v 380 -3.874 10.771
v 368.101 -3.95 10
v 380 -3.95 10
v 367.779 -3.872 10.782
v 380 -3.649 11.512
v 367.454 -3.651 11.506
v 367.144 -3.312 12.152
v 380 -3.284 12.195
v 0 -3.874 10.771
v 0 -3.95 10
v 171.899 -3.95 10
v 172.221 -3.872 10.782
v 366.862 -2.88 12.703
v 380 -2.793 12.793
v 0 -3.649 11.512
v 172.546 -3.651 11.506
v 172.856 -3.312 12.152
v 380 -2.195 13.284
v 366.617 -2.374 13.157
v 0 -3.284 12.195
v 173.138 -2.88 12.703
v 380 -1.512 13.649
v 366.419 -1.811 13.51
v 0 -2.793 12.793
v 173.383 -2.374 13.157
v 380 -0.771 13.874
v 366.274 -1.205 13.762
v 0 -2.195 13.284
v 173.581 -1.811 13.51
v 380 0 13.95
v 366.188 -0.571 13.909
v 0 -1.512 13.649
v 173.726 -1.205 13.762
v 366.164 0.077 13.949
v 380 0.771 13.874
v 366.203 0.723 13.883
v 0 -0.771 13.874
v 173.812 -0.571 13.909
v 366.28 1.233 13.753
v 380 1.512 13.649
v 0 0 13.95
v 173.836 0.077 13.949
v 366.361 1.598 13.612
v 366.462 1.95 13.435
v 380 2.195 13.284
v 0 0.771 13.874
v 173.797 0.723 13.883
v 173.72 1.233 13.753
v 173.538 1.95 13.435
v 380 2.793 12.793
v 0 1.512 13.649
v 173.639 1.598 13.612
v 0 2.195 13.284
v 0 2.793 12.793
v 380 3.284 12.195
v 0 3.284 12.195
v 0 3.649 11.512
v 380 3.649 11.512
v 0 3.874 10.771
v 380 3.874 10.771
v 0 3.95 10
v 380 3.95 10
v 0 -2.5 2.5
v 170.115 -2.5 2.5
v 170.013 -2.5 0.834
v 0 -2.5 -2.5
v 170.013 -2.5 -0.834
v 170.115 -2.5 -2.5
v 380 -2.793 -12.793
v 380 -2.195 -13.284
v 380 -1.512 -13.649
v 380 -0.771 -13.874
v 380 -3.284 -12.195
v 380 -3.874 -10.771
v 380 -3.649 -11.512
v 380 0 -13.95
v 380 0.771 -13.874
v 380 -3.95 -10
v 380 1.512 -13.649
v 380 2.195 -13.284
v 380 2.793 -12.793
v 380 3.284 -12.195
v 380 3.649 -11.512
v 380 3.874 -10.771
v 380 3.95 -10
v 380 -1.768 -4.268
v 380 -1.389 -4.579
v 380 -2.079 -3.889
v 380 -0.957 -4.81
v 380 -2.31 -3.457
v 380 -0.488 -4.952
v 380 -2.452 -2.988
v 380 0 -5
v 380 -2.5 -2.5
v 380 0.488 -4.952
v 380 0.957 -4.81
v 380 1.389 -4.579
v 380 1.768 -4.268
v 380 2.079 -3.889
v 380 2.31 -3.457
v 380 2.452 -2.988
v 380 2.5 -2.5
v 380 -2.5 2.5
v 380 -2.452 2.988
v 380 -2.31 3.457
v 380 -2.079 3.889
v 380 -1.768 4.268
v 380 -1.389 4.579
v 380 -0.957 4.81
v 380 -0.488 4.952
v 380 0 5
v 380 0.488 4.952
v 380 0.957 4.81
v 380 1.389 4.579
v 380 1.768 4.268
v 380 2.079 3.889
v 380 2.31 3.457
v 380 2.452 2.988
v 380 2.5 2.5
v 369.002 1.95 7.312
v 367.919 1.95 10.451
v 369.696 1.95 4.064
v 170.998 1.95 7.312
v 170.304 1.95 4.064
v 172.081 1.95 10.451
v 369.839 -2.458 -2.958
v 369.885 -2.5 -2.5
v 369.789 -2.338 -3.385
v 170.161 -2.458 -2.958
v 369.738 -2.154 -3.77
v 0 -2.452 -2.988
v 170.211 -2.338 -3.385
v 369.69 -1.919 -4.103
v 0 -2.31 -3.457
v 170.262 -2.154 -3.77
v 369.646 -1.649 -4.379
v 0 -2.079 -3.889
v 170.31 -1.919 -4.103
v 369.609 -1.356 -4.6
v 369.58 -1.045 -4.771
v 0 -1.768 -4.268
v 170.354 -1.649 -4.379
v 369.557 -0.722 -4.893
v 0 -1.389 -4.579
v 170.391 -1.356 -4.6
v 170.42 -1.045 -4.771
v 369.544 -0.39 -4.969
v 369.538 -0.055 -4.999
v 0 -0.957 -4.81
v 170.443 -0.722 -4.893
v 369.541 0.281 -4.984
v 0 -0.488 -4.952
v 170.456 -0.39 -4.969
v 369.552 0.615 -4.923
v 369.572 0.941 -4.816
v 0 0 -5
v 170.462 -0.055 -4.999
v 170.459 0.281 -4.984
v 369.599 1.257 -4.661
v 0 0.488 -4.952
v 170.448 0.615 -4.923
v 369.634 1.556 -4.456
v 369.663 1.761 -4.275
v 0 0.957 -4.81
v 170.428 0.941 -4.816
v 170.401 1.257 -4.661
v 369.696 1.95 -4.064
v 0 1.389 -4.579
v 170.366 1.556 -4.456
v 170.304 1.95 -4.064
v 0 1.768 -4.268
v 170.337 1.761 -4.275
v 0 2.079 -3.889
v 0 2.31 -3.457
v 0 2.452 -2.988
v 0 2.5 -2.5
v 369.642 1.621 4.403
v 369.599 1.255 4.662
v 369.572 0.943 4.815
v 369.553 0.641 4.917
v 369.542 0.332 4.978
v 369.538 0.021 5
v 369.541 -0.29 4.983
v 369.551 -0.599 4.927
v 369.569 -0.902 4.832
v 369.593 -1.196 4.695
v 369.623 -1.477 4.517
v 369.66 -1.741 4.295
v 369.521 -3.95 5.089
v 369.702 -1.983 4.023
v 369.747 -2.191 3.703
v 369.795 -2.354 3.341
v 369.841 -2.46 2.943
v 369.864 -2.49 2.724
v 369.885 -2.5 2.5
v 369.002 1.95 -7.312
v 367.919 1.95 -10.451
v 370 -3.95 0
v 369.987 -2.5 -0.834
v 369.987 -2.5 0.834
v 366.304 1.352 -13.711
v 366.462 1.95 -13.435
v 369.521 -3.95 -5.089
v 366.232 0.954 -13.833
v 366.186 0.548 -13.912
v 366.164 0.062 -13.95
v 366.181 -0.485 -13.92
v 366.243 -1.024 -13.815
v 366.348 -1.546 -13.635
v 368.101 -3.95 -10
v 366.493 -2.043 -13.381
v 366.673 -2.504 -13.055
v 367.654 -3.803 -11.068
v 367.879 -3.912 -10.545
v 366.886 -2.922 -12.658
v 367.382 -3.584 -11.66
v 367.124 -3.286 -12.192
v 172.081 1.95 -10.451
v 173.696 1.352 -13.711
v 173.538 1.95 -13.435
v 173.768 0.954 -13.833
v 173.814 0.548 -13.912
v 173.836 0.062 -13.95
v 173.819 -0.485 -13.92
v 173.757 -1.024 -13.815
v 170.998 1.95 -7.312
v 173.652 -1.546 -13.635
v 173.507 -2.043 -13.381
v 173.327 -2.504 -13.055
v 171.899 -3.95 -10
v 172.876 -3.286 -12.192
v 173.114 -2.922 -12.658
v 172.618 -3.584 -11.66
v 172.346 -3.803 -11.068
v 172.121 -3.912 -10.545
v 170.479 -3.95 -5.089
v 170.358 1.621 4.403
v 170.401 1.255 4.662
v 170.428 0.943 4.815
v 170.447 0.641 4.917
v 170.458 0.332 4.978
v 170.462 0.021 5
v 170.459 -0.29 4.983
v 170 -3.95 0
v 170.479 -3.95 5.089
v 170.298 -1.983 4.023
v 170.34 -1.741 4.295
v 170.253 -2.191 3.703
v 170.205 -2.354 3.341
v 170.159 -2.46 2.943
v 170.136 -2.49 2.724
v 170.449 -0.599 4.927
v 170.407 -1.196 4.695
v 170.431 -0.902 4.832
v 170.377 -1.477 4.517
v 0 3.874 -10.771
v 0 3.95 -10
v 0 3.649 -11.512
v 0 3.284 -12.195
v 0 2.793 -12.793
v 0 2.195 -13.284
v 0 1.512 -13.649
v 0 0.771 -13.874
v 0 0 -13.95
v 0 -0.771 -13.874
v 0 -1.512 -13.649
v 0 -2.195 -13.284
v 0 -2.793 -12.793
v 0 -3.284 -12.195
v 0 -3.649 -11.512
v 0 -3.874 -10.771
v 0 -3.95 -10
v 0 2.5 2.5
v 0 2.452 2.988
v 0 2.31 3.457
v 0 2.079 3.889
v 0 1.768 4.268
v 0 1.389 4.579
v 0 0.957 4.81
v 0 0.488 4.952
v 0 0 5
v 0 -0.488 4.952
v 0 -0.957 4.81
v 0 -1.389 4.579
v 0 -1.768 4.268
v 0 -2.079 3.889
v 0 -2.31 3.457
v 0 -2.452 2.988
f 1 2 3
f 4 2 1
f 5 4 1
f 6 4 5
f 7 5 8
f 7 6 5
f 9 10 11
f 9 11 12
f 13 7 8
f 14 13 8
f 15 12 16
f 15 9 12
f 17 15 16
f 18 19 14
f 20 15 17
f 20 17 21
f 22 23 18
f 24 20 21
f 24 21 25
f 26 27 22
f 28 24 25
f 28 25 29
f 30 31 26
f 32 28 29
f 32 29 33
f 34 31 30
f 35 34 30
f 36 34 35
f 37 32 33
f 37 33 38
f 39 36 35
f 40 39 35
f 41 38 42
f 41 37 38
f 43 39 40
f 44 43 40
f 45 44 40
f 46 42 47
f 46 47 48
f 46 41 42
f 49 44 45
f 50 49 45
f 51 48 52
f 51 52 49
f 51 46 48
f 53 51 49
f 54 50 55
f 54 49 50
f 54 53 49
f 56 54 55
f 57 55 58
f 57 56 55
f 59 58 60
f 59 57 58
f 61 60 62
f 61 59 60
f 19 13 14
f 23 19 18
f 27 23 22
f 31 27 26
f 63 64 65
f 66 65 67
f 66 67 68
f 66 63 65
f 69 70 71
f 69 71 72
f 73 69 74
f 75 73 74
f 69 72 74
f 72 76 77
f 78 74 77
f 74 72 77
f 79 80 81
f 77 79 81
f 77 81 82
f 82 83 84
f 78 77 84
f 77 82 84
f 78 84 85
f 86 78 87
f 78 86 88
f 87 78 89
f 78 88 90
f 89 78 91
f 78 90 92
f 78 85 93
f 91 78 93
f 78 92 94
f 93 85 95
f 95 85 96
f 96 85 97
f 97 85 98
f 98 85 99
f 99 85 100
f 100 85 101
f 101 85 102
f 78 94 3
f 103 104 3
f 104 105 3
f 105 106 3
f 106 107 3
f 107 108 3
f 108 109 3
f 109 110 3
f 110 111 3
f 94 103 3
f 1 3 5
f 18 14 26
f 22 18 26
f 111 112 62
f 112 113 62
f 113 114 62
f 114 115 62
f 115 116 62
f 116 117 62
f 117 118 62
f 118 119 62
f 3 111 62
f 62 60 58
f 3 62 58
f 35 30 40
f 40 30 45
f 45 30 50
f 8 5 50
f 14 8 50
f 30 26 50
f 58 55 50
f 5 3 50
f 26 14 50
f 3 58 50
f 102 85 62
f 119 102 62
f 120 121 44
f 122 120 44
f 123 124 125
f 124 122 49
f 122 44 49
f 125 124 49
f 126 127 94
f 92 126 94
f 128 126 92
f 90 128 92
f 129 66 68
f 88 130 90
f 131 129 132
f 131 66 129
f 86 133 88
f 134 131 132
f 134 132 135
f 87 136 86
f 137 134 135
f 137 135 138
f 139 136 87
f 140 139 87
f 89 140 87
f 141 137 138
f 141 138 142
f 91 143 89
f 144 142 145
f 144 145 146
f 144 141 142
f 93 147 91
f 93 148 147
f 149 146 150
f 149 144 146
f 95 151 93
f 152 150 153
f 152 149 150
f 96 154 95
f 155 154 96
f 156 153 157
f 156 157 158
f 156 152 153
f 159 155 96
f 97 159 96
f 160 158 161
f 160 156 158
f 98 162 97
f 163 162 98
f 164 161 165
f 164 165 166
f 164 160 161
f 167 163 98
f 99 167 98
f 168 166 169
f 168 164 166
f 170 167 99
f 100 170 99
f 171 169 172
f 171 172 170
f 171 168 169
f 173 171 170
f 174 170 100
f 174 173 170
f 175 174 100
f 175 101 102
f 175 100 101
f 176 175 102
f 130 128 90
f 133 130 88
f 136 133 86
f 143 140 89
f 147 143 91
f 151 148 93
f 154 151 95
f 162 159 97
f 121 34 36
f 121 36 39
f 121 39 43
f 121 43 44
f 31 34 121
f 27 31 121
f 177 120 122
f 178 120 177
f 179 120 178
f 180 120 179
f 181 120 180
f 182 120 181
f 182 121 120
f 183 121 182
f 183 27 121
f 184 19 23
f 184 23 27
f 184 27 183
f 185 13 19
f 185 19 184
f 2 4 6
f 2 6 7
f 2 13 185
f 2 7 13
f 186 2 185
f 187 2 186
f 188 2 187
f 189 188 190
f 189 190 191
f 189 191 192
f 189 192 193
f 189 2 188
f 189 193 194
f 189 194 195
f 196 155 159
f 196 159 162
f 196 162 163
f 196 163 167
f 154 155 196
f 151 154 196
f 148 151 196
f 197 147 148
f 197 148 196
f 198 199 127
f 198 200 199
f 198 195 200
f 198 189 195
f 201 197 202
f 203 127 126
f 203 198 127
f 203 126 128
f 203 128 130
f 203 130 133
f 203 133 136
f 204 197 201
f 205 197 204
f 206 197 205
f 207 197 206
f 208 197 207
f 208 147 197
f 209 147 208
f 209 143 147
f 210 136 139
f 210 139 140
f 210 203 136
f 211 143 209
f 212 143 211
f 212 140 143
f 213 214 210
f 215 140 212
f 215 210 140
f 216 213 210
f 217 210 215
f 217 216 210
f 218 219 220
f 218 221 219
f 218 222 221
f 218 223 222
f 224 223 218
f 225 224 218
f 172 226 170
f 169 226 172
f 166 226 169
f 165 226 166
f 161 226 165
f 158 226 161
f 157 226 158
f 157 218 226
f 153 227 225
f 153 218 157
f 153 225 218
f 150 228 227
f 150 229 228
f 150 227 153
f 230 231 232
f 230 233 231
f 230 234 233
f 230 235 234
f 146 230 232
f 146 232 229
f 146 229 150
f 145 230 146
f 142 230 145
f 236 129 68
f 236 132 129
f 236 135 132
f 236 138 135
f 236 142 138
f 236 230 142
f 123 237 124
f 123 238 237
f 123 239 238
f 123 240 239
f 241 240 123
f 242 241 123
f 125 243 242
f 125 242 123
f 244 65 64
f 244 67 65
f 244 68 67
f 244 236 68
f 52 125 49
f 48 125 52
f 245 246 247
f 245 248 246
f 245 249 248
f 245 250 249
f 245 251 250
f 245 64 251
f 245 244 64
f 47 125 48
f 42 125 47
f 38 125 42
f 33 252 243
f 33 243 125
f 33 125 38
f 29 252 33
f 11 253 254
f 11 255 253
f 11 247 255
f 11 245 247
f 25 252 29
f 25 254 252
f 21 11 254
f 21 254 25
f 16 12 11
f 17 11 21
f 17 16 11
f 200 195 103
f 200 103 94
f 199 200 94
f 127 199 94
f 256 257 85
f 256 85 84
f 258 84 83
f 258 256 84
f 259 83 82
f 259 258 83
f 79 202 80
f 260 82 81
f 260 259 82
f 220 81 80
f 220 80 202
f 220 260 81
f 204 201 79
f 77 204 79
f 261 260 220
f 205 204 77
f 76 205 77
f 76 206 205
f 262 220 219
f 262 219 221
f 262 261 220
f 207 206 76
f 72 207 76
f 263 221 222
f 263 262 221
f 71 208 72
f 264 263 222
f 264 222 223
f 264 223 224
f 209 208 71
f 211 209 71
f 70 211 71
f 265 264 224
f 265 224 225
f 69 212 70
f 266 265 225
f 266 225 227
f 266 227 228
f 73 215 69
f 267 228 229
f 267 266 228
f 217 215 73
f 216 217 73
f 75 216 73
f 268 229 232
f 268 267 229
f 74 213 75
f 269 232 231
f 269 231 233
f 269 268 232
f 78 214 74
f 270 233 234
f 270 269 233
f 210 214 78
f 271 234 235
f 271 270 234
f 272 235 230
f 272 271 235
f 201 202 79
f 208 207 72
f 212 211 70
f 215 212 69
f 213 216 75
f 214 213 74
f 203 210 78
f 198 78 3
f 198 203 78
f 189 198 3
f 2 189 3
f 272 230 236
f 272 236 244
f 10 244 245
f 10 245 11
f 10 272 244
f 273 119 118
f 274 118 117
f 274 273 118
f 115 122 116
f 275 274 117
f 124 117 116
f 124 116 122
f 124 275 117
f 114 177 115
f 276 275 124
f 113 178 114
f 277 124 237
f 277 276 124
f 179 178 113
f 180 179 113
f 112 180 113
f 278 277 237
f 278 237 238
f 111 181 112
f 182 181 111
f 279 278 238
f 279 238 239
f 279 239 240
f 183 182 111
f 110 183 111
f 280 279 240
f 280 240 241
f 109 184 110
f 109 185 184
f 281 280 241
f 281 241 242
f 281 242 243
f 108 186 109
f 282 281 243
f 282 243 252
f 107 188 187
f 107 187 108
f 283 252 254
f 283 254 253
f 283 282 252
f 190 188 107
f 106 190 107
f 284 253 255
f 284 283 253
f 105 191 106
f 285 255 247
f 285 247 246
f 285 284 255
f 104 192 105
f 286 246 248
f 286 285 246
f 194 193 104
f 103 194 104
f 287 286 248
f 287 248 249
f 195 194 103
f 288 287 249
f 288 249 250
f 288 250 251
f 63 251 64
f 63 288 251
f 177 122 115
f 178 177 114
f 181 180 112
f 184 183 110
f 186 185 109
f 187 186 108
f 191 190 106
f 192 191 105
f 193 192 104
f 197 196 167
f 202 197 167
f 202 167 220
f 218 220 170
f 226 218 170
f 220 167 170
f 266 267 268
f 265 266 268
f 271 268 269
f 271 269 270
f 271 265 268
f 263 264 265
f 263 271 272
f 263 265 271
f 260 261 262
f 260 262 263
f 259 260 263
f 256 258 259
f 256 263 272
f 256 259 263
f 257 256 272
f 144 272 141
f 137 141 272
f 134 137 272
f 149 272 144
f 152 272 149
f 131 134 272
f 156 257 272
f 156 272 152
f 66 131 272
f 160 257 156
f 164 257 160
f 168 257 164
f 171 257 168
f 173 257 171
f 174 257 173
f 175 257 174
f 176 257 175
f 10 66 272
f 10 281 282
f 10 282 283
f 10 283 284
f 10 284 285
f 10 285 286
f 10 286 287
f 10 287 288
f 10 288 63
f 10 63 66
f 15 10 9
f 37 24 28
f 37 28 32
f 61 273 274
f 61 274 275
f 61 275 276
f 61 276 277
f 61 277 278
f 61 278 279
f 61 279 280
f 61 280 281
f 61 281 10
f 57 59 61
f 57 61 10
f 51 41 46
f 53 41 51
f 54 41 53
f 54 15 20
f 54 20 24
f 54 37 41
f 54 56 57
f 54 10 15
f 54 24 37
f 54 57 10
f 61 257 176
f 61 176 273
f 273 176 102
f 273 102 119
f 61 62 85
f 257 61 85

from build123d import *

# Parameters (mm, degrees)
EXTRUDE_1_DEPTH     = 380
CUT_EXTRUDE_1_DEPTH = 390
CUT_EXTRUDE_2_DEPTH = 5.9


with BuildPart() as part:
    # 草图2 → 凸台-拉伸1 (new body)
    with BuildSketch(Plane(origin=(0, 0, 0), x_dir=(0, 0, -1), z_dir=(1, 0, 0))):
        with BuildLine():
            Line((-10, 3.95), (10, 3.95))
            ThreePointArc((10, 3.95), (13.95, 0), (10, -3.95))
            Line((10, -3.95), (-10, -3.95))
            ThreePointArc((-10, -3.95), (-13.95, 0), (-10, 3.95))
        make_face()
    extrude(amount=EXTRUDE_1_DEPTH)

    # 草图3 → 切除-拉伸1 (cut)
    with BuildSketch(Plane.ZY):
        with BuildLine():
            Line((2.5, -2.5), (-2.5, -2.5))
            ThreePointArc((-2.5, -2.5), (-5, 0), (-2.5, 2.5))
            Line((-2.5, 2.5), (2.5, 2.5))
            ThreePointArc((2.5, 2.5), (5, 0), (2.5, -2.5))
        make_face()
    extrude(amount=-CUT_EXTRUDE_1_DEPTH, mode=Mode.SUBTRACT)

    # 草图5 → 切除-拉伸2 (cut)
    with BuildSketch(Plane.XZ.offset(3.95)):
        with BuildLine():
            Line((197.278769414, 27.278769414), (342.721230586, 27.278769414))
            ThreePointArc((342.721230586, 27.278769414), (370, 0), (342.721230586, -27.278769414))
            Line((342.721230586, -27.278769414), (197.278769414, -27.278769414))
            ThreePointArc((197.278769414, -27.278769414), (170, 0), (197.278769414, 27.278769414))
        make_face()
    extrude(amount=-CUT_EXTRUDE_2_DEPTH, mode=Mode.SUBTRACT)


solid = part.part
